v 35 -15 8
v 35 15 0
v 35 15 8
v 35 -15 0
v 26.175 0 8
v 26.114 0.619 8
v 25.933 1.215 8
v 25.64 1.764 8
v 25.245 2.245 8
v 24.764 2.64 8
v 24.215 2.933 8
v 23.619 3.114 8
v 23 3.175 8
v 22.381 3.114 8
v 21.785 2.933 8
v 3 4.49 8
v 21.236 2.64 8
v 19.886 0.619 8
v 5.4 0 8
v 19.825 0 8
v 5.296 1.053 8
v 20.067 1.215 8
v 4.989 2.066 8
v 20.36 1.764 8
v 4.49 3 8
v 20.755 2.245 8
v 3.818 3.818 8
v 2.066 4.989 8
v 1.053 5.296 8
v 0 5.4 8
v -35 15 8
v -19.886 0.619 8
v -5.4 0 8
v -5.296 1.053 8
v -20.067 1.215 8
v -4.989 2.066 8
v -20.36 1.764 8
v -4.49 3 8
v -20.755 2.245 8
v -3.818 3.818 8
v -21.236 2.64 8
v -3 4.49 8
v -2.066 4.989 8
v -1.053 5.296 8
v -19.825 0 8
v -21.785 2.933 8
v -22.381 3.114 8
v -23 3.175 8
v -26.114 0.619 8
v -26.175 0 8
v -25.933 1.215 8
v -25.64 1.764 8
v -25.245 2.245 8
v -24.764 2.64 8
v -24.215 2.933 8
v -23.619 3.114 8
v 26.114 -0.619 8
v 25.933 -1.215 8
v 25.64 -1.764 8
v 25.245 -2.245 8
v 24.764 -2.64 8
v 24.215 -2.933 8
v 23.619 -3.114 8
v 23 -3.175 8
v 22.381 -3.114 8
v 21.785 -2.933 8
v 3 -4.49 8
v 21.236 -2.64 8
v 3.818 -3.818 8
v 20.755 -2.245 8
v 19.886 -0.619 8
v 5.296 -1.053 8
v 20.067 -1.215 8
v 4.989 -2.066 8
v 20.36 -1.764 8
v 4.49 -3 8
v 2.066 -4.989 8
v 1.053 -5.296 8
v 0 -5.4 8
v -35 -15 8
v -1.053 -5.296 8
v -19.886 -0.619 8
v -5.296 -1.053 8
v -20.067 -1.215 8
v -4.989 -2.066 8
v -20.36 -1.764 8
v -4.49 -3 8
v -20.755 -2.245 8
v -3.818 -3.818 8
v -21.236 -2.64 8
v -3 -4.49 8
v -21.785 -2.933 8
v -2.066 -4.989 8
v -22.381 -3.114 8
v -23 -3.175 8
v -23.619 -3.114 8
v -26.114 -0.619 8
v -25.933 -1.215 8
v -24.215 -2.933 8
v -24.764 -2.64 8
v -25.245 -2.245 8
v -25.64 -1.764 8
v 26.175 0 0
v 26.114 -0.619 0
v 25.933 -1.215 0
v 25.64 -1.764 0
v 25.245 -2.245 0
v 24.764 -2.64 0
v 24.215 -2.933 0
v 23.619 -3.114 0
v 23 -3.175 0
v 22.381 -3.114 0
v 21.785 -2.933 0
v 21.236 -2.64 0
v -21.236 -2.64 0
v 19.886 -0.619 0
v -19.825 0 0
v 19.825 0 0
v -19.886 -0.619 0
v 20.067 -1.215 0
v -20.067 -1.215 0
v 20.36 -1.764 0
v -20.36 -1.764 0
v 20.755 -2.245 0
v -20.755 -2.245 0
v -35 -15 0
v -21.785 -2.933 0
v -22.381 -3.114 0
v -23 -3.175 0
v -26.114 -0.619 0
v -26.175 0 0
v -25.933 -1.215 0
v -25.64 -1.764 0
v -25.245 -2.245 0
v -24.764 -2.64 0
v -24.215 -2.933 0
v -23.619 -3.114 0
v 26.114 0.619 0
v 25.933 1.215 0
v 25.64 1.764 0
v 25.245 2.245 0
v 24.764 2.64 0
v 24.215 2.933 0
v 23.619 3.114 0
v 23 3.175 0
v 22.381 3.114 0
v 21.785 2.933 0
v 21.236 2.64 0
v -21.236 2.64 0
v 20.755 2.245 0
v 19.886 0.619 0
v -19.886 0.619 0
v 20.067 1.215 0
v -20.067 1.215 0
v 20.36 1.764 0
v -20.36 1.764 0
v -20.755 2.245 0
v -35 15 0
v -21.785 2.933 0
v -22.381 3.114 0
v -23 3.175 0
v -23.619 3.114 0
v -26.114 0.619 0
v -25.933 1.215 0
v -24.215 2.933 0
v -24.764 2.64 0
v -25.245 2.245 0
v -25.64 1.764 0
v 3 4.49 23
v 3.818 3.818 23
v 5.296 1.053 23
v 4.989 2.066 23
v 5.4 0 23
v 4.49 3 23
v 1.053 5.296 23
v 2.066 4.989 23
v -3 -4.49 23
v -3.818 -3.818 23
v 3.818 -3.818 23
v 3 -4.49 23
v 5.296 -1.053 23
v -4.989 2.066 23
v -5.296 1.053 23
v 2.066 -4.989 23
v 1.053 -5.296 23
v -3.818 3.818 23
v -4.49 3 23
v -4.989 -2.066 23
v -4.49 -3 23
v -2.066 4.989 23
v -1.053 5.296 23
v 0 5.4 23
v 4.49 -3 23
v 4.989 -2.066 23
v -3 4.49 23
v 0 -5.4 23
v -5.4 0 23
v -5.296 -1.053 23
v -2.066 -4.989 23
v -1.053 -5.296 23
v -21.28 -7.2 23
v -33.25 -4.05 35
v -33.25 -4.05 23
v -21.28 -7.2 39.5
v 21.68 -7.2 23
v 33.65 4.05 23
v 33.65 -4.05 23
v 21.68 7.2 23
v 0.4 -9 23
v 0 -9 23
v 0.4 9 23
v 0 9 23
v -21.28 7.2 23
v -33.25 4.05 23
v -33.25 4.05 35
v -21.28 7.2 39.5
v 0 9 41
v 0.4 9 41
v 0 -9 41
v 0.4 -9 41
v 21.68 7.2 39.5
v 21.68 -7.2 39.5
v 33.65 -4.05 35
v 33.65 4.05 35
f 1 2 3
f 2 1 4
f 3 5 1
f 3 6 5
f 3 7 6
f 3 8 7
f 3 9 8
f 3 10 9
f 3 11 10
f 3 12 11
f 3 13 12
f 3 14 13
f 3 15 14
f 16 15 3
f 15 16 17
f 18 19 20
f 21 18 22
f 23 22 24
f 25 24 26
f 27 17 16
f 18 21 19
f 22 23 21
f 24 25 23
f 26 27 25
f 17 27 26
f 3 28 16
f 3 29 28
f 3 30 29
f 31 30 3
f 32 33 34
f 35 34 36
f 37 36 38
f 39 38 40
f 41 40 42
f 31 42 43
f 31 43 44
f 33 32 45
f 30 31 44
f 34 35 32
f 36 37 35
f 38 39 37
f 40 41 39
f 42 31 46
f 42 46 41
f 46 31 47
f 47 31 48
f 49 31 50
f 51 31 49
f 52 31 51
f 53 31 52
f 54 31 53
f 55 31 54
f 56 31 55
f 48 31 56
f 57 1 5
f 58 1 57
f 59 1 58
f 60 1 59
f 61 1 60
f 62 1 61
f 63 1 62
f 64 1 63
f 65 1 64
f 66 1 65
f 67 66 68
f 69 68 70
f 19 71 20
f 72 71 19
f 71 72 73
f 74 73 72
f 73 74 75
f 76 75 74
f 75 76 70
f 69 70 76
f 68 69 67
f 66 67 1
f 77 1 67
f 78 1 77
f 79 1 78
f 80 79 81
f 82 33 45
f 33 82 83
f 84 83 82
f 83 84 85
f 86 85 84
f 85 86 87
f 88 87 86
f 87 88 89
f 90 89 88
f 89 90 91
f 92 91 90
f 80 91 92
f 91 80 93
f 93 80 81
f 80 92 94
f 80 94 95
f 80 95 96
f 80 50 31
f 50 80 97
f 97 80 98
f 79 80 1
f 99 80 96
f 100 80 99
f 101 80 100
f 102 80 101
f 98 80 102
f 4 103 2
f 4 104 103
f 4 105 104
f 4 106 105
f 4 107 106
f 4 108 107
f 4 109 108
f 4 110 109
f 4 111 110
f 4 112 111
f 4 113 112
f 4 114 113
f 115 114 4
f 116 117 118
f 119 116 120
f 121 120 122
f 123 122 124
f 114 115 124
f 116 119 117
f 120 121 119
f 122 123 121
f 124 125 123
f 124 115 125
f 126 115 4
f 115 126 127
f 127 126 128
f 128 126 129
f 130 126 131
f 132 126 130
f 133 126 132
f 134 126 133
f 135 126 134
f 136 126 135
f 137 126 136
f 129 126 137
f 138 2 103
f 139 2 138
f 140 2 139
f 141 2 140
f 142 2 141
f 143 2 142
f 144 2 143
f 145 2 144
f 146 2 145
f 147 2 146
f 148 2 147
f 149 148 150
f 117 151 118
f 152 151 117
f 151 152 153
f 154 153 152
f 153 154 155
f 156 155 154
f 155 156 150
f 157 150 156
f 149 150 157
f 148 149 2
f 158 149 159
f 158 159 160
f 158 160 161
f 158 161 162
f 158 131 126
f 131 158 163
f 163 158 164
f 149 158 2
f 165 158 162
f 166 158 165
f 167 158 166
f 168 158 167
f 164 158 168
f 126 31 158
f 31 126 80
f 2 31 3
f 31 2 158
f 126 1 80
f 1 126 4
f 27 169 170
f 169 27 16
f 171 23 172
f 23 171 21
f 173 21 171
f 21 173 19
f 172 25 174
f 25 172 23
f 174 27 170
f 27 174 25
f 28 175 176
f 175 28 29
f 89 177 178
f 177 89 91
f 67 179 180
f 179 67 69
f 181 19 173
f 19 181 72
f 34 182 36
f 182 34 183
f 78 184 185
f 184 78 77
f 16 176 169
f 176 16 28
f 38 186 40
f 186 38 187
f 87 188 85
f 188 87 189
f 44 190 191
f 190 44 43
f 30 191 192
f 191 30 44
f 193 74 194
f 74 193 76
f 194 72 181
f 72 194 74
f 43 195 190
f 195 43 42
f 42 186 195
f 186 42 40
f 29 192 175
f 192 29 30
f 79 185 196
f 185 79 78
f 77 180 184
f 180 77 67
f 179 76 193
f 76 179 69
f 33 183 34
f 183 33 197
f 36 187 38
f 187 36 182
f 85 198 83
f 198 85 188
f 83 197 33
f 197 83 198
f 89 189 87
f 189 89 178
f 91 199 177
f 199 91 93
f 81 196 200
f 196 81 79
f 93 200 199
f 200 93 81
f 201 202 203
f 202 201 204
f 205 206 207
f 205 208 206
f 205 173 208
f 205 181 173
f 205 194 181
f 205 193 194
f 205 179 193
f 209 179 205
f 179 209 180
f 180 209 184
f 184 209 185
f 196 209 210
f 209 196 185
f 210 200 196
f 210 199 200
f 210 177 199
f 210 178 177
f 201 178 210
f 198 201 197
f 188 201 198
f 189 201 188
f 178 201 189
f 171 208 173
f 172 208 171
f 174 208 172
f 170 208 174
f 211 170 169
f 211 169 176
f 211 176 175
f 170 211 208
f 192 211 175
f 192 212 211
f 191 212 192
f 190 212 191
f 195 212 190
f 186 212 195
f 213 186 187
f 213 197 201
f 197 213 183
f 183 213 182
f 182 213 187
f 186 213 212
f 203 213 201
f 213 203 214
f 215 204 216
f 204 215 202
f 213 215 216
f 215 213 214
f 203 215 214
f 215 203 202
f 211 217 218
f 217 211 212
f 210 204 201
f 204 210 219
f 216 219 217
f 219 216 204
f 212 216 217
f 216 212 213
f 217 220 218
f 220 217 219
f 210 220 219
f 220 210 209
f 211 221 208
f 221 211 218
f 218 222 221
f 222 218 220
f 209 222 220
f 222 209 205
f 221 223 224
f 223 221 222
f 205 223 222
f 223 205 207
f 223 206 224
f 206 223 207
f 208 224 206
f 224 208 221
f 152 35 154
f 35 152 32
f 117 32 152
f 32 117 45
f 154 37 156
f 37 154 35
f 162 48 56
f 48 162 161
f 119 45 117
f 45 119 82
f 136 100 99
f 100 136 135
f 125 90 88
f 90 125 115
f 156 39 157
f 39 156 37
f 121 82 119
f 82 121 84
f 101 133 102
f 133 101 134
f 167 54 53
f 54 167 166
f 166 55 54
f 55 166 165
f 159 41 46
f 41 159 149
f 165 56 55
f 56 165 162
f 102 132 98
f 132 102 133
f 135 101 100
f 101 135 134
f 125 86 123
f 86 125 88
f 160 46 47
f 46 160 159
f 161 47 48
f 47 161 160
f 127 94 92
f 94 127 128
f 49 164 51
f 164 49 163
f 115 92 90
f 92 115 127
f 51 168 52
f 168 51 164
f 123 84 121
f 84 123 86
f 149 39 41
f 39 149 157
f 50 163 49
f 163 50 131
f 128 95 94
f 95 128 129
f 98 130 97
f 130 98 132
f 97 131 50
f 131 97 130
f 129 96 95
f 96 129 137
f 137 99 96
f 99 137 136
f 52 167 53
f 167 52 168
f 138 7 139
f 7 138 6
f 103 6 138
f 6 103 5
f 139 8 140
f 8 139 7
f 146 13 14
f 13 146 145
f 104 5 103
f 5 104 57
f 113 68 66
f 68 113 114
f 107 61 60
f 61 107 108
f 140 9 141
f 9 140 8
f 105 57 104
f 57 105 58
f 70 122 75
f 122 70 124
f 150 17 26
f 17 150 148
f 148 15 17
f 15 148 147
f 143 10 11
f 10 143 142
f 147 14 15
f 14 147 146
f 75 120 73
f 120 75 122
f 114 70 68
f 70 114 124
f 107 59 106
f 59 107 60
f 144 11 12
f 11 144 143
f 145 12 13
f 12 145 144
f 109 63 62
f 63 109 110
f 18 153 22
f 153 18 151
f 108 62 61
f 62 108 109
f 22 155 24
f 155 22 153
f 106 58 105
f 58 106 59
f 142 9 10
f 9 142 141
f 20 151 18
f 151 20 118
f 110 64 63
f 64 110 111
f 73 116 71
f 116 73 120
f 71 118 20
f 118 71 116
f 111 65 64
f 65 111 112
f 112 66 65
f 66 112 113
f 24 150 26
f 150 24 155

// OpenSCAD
$fn = 32;

// ----------------------------------------------------------------------
// Boat cleat: 70 mm base, horn 32 mm up
// ----------------------------------------------------------------------

// --- parameters (mm) ---
base_l = 70;              // base length
base_w = 30;              // base width
base_t = 8;               // base thickness
horn_len = 66.5;          // horn length
horn_d = 18;              // horn diameter at the middle
horn_z = 32;              // horn axis height
end_drop = 6;             // how far the horn tips drop
post_d = 10.8;            // centre post diameter
holes_d = 6.35;           // fixing holes
hole_x = 23;              // fixing hole spacing

difference() {
  union() {
    translate([-35, -15, 0]) cube([base_l, base_w, base_t]);
    /* centre post, sunk 1 mm into the base */
    translate([0, 0, 7]) cylinder(h = 25, d = post_d);
    /* horn: a hull chain of boxes, full in the middle and lighter at the tips */
    hull() {
      translate([-33.25, -4.05, 23]) cube([0.4, 8.1, 12], center = false);
      translate([-21.28, -7.2, 23]) cube([0.4, 14.4, 16.5], center = false);
    }
    hull() {
      translate([-21.28, -7.2, 23]) cube([0.4, 14.4, 16.5], center = false);
      translate([0, -9, 23]) cube([0.4, 18, 18], center = false);
    }
    hull() {
      translate([0, -9, 23]) cube([0.4, 18, 18], center = false);
      translate([21.28, -7.2, 23]) cube([0.4, 14.4, 16.5], center = false);
    }
    hull() {
      translate([21.28, -7.2, 23]) cube([0.4, 14.4, 16.5], center = false);
      translate([33.25, -4.05, 23]) cube([0.4, 8.1, 12], center = false);
    }
  }
  translate([-23, 0, -2.5]) cylinder(h = base_t + 5, d = holes_d);
  translate([23, 0, -2.5]) cylinder(h = base_t + 5, d = holes_d);
}
